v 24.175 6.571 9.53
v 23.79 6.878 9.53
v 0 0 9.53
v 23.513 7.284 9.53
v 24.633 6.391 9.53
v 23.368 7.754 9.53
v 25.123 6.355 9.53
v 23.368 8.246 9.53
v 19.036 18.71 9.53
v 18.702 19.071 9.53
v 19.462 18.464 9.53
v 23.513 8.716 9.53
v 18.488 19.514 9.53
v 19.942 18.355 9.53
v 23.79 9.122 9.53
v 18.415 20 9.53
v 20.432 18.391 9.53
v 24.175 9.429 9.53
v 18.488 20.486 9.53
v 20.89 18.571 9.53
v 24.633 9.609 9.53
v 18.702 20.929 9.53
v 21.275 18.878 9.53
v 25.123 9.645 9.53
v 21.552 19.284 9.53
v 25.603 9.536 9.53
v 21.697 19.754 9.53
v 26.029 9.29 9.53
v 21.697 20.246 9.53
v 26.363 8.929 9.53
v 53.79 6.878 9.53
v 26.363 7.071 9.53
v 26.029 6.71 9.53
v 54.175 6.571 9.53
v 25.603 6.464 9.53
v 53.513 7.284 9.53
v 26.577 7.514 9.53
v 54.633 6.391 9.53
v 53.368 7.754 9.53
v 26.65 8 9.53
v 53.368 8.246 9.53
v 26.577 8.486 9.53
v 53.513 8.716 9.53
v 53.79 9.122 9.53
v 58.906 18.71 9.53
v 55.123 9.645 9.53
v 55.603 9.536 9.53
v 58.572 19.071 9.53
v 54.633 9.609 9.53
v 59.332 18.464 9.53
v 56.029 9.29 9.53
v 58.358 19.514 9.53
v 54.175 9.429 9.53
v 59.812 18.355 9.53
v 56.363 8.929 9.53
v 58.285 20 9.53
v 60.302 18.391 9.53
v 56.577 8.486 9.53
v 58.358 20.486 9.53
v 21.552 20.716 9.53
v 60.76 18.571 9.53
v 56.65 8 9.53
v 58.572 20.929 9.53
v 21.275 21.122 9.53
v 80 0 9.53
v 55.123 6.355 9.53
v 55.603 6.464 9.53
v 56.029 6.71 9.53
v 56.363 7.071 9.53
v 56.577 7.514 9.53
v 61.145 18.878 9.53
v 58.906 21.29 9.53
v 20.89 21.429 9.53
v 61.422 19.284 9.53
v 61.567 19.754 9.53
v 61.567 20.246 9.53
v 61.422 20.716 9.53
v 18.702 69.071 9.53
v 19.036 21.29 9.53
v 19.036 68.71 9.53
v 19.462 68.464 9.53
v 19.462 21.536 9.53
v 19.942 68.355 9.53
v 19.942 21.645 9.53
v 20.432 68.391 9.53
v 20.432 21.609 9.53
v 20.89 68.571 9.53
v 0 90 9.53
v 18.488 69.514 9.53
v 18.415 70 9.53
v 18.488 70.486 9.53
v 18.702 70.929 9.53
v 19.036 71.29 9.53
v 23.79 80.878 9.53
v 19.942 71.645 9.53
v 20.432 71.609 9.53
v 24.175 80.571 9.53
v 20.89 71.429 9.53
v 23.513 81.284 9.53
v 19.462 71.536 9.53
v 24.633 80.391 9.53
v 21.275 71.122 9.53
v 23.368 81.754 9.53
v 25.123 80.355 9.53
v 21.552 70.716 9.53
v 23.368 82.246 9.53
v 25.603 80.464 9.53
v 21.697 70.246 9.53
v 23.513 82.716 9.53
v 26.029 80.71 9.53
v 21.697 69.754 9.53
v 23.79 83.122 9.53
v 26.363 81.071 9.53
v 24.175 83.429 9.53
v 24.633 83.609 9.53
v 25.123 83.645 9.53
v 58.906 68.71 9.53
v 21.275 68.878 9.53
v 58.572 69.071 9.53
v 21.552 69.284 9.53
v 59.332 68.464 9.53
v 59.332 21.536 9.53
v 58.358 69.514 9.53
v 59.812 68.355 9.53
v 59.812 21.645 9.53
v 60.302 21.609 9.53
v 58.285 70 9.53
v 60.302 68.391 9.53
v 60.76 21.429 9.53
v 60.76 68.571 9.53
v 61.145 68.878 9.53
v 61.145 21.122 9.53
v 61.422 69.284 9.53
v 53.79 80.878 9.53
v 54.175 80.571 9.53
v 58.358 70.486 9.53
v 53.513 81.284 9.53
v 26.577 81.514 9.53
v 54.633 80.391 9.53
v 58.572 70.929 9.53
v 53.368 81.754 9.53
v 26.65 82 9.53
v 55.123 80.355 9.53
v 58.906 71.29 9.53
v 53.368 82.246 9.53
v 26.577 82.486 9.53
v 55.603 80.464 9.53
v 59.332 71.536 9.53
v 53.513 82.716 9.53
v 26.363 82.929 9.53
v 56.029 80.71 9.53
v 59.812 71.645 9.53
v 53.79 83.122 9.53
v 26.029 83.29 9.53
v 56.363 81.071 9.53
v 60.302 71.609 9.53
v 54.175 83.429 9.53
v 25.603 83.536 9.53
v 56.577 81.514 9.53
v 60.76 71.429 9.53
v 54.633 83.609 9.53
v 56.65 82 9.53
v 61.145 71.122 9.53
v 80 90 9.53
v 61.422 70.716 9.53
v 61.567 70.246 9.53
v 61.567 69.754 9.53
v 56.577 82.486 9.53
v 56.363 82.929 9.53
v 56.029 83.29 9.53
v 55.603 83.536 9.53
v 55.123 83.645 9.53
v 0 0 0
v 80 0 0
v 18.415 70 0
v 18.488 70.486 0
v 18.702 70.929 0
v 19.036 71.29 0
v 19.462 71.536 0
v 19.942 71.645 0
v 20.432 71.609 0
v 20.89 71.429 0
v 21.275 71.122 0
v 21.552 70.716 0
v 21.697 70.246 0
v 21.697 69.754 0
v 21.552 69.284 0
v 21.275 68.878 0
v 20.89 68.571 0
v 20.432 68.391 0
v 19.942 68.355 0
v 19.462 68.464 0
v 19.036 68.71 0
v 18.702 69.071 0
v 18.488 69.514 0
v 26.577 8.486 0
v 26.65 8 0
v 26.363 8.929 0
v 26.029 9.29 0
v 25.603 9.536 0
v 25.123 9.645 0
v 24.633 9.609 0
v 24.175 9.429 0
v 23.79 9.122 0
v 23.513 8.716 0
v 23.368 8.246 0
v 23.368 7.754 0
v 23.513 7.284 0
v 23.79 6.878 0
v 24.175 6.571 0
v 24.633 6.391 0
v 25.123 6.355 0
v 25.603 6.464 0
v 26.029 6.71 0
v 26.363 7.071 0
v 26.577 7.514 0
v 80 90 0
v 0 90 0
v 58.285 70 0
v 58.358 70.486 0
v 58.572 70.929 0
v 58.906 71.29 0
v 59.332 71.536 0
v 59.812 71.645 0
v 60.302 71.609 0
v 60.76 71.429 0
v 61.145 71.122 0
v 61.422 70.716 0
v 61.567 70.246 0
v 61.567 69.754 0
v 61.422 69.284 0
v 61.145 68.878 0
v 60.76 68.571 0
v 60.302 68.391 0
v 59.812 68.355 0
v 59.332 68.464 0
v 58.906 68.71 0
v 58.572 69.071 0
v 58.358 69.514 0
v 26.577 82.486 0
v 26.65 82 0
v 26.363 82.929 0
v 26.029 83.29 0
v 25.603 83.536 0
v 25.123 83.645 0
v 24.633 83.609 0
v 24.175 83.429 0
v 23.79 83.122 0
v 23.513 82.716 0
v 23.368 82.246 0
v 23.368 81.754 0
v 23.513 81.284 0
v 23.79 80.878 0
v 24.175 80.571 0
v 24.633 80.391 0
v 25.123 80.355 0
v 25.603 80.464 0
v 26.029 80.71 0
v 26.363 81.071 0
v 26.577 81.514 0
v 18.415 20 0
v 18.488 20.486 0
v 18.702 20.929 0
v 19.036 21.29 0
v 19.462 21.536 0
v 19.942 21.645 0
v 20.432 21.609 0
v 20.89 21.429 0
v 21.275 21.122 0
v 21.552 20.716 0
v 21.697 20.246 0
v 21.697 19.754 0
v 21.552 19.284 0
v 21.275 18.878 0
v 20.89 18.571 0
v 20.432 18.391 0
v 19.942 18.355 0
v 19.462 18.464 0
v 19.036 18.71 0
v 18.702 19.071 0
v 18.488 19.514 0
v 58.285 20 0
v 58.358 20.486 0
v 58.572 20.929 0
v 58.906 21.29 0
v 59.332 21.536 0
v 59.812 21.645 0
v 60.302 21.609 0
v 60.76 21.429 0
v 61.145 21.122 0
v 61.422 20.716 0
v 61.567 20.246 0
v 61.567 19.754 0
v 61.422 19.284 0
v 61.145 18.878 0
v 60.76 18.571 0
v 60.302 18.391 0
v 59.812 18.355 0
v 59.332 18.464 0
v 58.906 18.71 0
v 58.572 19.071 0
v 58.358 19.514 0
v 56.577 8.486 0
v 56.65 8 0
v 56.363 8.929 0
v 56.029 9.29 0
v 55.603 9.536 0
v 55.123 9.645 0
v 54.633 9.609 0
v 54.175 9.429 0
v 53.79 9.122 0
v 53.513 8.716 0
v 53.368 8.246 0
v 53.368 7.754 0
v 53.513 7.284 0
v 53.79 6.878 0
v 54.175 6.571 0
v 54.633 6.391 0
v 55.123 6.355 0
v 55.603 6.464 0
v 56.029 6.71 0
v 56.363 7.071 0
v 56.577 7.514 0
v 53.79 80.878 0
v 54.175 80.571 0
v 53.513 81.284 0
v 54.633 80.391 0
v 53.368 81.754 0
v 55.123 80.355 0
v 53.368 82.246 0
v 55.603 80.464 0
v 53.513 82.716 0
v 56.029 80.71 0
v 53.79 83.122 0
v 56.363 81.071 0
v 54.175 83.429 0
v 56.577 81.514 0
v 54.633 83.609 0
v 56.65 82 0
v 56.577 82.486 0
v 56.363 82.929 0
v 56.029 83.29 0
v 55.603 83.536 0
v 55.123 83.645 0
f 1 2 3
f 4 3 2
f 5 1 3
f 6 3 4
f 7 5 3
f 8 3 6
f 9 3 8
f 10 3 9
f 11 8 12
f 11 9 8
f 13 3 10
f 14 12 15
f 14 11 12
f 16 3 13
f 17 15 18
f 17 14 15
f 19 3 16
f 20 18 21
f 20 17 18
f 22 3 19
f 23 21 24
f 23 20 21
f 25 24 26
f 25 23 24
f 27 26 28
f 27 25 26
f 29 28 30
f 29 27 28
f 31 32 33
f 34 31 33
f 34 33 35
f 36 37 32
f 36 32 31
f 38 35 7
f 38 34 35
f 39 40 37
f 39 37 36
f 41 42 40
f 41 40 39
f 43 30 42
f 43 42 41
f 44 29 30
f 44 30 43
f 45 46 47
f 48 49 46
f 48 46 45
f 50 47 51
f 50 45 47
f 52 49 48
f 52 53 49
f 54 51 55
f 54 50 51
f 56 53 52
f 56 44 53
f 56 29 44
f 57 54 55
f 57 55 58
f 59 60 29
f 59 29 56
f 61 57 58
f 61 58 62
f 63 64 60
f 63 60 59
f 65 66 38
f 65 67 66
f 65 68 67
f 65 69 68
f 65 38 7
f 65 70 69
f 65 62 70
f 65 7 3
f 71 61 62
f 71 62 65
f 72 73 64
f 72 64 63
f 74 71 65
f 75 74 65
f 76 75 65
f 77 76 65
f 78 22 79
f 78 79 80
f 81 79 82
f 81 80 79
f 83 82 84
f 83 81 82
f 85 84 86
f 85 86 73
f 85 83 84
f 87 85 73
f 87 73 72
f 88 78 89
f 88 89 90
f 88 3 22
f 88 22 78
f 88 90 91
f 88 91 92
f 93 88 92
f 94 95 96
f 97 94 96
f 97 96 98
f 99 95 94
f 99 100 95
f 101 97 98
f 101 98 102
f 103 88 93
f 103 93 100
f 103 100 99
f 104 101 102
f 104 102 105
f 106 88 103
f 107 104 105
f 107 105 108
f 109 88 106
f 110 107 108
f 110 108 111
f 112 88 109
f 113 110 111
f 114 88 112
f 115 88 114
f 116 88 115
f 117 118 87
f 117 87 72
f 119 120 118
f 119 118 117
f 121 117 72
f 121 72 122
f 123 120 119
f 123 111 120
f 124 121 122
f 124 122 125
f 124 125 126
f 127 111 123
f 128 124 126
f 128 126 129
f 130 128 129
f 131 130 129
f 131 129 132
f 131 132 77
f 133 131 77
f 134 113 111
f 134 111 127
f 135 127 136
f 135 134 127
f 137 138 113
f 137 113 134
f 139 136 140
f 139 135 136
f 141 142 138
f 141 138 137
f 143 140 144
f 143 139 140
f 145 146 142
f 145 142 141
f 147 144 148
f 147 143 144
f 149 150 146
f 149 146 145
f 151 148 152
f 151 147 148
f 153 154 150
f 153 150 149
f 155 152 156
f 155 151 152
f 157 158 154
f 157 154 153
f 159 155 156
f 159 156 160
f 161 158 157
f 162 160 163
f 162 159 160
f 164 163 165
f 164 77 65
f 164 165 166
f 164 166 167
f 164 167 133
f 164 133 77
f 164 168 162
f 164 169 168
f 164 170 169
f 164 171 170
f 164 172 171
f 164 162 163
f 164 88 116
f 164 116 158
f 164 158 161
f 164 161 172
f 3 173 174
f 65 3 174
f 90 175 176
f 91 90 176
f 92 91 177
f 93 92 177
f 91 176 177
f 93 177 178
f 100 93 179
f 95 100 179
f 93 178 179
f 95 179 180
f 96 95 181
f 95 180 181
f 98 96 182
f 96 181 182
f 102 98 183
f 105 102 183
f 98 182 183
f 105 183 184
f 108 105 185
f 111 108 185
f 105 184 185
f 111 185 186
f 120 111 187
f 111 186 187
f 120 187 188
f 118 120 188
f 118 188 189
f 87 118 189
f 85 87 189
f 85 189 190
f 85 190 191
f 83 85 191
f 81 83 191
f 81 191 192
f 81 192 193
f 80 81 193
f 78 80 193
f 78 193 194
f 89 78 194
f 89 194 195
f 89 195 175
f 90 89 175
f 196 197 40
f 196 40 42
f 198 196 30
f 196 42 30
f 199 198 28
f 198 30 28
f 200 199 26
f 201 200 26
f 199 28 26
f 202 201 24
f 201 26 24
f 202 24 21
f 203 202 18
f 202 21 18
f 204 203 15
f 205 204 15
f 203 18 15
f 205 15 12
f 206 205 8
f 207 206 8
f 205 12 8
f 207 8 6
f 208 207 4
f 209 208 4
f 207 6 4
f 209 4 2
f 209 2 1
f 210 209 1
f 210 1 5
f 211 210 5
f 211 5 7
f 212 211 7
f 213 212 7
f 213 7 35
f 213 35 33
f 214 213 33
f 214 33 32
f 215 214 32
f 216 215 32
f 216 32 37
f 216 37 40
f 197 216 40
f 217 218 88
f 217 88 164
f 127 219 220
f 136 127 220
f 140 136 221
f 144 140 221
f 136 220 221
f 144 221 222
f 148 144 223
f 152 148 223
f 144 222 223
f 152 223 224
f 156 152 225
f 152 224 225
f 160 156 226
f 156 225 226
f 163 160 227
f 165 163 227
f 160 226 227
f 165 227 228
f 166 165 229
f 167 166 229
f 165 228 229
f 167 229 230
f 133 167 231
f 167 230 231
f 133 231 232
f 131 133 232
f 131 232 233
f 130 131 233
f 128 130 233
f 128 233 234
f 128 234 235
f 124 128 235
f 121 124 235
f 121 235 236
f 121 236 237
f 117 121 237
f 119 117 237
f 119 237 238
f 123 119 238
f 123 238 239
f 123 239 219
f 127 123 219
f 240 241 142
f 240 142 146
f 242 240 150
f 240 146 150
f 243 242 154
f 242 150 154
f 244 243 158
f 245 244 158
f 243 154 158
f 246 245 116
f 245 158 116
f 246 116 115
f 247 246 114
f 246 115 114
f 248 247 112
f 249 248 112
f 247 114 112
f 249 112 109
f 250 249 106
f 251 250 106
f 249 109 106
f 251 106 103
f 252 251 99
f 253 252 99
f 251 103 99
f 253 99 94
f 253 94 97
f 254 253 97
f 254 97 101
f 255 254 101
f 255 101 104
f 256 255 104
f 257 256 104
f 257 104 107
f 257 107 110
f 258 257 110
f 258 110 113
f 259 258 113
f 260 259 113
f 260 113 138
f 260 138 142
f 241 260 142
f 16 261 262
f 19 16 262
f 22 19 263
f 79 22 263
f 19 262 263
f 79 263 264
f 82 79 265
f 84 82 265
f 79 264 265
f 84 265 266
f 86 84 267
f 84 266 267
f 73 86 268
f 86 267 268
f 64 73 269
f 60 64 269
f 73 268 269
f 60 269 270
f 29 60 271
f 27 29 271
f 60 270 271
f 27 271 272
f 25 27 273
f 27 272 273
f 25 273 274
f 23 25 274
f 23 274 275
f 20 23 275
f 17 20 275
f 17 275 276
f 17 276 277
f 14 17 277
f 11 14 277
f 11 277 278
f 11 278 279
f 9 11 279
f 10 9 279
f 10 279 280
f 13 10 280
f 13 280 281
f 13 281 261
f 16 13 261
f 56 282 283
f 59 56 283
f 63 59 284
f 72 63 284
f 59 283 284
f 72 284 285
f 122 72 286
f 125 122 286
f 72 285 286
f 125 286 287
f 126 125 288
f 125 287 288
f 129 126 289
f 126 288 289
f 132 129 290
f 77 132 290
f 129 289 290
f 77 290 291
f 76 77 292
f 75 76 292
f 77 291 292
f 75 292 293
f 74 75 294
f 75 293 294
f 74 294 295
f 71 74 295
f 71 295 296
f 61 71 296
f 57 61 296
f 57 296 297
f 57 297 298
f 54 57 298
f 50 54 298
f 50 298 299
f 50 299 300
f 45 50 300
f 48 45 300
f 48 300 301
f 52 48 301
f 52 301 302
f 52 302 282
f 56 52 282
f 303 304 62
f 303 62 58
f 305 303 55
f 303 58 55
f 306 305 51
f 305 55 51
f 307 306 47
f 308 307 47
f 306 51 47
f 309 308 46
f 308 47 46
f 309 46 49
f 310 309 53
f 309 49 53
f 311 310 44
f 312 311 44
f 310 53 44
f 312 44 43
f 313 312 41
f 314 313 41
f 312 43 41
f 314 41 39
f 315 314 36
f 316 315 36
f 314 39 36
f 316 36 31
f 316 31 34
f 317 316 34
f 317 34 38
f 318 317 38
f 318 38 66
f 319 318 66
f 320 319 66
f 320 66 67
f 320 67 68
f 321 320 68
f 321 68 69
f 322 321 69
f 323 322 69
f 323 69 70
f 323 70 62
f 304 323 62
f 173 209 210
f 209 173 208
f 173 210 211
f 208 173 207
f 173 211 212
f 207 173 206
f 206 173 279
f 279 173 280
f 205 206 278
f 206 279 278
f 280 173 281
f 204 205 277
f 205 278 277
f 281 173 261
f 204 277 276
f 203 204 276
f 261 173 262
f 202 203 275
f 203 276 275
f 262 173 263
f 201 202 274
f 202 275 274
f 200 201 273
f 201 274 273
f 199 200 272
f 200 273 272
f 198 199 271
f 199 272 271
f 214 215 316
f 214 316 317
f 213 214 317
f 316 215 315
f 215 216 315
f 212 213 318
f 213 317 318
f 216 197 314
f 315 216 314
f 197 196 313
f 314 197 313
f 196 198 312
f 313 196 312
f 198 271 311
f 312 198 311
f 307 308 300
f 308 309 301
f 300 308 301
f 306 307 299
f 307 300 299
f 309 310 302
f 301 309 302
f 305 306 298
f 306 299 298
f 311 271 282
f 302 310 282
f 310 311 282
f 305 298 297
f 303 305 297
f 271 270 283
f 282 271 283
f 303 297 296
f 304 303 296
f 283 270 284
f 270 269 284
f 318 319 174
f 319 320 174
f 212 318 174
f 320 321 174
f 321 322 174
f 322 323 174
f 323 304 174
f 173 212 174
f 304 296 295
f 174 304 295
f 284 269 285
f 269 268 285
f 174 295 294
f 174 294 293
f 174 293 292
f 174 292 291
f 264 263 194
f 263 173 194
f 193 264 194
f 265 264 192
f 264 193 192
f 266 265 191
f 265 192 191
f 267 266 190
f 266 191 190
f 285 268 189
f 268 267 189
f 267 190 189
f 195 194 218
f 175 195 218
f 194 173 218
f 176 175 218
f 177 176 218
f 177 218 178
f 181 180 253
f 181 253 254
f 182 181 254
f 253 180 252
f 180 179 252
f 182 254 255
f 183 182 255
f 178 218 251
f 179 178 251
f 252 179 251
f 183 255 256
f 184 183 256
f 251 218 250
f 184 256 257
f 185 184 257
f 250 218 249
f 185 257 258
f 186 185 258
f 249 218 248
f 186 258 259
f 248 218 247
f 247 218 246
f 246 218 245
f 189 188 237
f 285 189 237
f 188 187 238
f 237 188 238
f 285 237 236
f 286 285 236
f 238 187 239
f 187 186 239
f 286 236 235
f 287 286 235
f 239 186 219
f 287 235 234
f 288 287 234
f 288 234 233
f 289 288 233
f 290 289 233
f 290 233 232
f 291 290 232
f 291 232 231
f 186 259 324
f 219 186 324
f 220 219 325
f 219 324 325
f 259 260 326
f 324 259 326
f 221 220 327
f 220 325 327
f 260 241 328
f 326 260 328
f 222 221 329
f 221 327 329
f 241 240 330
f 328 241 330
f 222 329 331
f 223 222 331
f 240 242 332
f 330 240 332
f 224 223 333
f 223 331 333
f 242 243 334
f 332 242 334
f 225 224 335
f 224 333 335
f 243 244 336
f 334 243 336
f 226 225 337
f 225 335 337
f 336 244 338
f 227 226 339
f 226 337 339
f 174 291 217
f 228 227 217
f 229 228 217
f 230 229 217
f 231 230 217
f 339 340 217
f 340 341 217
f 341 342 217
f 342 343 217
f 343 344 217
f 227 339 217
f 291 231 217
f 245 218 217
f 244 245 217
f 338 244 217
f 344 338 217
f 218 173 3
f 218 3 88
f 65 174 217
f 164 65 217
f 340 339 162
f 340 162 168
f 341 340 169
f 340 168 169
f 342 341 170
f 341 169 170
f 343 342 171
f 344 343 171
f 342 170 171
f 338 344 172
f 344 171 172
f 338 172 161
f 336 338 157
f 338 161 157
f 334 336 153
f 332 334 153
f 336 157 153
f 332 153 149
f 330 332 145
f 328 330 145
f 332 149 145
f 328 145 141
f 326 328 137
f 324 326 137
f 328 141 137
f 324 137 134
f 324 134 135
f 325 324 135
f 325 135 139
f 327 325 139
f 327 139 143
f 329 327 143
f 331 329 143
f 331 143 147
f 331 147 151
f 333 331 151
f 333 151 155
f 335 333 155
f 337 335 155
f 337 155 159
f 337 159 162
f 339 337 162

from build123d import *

# Parameters (mm, degrees)
SKETCH1_W             = 80
SKETCH1_H             = 90
SKETCH1_R             = 1.65
BOSS_EXTRUDE1_DEPTH   = 9.53
M4X0_7_TAPPED_HOLE1_D = 3.3
M4X0_7_TAPPED_HOLE2_D = 3.3


with BuildPart() as part:
    # Sketch1 → Boss-Extrude1 (new body)
    # profile 1 of 5: a face of its own
    with BuildSketch(Plane.XY):
        with Locations((40, 45)):
            Rectangle(SKETCH1_W, SKETCH1_H)
        with Locations((25, 82)):
            Circle(SKETCH1_R, mode=Mode.SUBTRACT)
        with Locations((55, 82)):
            Circle(SKETCH1_R, mode=Mode.SUBTRACT)
        with Locations((25, 8)):
            Circle(SKETCH1_R, mode=Mode.SUBTRACT)
        with Locations((55, 8)):
            Circle(SKETCH1_R, mode=Mode.SUBTRACT)
    # profile 2 of 5: a face of its own
    with BuildSketch(Plane.XY):
        with Locations((25, 8)):
            Circle(SKETCH1_R)
    # profile 3 of 5: a face of its own
    with BuildSketch(Plane.XY):
        with Locations((55, 8)):
            Circle(SKETCH1_R)
    # profile 4 of 5: a face of its own
    with BuildSketch(Plane.XY):
        with Locations((55, 82)):
            Circle(SKETCH1_R)
    # profile 5 of 5: a face of its own
    with BuildSketch(Plane.XY):
        with Locations((25, 82)):
            Circle(SKETCH1_R)
    extrude(amount=BOSS_EXTRUDE1_DEPTH)

    # M4x0.7 Tapped Hole1 (through all)
    with Locations(Plane(origin=(20.065, 70, 9.53), x_dir=(1, 0, 0), z_dir=(0, 0, 1))):
        with Locations((0, 0), (39.87, 0), (39.87, -50), (0, -50)):
            Hole(M4X0_7_TAPPED_HOLE1_D / 2)

    # M4x0.7 Tapped Hole2 (through all)
    with Locations(Plane(origin=(55, 8, 0), x_dir=(-1, 0, 0), z_dir=(0, 0, -1))):
        with Locations((0, 0), (30, 0), (30, 74), (0, 74)):
            Hole(M4X0_7_TAPPED_HOLE2_D / 2)


solid = part.part
